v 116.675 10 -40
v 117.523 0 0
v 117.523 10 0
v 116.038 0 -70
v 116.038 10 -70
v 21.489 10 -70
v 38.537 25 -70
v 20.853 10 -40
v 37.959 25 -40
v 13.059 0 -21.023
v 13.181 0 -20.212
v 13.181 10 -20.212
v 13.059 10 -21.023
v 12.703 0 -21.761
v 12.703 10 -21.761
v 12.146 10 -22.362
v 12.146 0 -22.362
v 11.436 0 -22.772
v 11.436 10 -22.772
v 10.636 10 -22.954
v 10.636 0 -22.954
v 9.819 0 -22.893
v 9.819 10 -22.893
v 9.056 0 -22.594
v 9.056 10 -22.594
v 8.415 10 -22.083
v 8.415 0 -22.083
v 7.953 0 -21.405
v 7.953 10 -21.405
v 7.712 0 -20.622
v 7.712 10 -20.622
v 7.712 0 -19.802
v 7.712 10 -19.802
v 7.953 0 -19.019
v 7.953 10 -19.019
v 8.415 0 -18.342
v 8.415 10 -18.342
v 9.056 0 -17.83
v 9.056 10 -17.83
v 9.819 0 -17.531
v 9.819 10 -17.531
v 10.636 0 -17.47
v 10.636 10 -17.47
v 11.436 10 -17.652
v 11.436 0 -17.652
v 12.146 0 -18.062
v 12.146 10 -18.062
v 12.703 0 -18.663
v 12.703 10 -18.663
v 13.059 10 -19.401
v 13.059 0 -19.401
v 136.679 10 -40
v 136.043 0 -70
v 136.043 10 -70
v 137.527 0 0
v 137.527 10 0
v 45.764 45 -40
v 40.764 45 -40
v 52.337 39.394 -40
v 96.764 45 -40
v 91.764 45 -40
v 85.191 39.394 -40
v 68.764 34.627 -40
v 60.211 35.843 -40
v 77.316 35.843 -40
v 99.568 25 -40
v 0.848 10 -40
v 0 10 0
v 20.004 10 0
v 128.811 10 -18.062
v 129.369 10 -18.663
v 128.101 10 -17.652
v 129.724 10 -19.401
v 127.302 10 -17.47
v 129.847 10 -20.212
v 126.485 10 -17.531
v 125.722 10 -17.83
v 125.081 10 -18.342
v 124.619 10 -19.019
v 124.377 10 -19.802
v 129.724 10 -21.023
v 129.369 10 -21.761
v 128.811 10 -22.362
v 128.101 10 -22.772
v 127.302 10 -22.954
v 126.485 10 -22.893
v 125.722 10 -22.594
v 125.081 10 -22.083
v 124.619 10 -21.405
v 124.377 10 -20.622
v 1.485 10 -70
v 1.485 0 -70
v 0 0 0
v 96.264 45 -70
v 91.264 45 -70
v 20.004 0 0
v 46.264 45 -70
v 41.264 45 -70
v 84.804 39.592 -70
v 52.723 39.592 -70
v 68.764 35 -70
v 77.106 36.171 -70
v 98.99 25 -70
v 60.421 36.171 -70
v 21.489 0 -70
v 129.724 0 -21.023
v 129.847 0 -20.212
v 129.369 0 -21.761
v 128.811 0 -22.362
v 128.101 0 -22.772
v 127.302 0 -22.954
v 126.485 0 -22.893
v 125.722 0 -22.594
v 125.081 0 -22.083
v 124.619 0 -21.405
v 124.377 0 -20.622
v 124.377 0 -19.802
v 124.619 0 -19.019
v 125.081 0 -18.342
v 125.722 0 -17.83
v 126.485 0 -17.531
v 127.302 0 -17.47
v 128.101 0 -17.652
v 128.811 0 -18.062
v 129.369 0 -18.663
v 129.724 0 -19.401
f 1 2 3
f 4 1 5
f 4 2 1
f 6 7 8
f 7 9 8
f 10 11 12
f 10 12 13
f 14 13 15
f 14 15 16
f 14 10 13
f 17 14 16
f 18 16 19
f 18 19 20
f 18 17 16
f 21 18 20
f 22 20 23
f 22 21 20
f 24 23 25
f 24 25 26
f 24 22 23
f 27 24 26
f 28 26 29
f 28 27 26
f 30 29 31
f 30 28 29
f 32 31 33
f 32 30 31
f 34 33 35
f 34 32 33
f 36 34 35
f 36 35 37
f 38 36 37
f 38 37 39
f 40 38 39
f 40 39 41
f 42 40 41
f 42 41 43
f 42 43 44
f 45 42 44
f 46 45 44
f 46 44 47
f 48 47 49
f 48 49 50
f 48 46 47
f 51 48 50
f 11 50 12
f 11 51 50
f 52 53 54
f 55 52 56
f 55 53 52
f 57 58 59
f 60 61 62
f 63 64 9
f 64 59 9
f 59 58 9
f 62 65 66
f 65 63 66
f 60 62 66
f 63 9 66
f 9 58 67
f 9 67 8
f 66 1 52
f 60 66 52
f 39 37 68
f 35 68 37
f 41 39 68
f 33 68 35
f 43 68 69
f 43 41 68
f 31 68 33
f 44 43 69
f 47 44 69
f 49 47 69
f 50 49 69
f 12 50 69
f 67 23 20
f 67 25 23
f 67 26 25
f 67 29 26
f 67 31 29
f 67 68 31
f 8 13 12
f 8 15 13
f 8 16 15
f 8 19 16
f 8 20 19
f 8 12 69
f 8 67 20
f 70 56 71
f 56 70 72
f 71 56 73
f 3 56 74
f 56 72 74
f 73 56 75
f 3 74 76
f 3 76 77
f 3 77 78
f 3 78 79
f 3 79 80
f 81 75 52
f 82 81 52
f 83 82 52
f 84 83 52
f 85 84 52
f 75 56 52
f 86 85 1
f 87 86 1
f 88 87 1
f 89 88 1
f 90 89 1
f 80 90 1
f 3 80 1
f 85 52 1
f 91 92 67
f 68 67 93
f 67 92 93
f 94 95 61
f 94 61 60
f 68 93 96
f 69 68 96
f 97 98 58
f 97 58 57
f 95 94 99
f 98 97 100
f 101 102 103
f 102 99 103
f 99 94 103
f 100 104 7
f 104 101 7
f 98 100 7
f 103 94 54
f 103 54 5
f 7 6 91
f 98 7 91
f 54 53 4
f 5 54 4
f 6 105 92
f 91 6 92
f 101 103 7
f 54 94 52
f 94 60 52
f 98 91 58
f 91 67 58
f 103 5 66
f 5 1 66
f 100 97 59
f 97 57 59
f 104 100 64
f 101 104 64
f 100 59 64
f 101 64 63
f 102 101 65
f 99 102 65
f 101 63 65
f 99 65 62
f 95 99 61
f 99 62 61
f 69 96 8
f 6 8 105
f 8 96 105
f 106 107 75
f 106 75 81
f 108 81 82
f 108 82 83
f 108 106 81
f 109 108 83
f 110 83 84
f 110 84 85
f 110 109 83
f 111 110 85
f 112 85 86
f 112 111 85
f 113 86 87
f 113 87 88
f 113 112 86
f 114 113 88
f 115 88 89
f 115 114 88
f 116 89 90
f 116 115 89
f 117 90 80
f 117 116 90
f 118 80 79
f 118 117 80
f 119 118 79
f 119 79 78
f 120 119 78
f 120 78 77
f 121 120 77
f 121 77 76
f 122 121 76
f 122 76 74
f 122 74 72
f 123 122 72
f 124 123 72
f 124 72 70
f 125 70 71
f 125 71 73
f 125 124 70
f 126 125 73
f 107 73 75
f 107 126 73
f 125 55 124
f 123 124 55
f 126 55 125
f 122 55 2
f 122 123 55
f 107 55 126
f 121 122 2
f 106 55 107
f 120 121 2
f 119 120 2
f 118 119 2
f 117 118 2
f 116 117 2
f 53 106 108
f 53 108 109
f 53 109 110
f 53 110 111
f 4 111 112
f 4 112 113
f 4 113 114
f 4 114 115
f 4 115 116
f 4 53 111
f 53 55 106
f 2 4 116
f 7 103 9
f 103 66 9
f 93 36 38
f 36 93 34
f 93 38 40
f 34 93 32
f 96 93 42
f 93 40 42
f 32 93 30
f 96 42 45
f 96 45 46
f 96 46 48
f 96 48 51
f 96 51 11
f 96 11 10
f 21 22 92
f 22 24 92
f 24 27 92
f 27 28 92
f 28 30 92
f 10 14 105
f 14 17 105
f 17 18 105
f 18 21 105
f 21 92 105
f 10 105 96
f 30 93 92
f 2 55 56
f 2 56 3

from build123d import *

# Parameters (mm, degrees)
SKETCH1_R             = 2.75
BOSS_EXTRUDE1_DEPTH   = 10
BOSS_EXTRUDE1_2_DEPTH = 10


with BuildPart() as part:
    # Sketch1 → Boss-Extrude1 (new body)
    with BuildSketch(Plane(origin=(0, 0, 0), x_dir=(1, 0, 0), z_dir=(0, 1, 0))):
        Polygon((0, 0), (20.004497681, 0), (21.489122754, 70), (1.484625073, 70), align=None)
        with Locations((10.430924608, 20.212041611)):
            Circle(SKETCH1_R, mode=Mode.SUBTRACT)
    extrude(amount=BOSS_EXTRUDE1_DEPTH)



with BuildPart() as body_2:
    # Sketch1 → Boss-Extrude1 2 (new body)
    with BuildSketch(Plane(origin=(0, 0, 0), x_dir=(1, 0, 0), z_dir=(0, 1, 0))):
        Polygon((116.0383729, 70), (136.042870581, 70), (137.527495654, 0), (117.522997972, 0), align=None)
        with Locations((127.096571045, 20.212041611)):
            Circle(SKETCH1_R, mode=Mode.SUBTRACT)
    extrude(amount=BOSS_EXTRUDE1_2_DEPTH)


with BuildPart() as part_1:
    add(part.part)

    add(body_2.part)  # Loft1 merges body 2
    # Sketch2 → Loft1 section 0
    with BuildSketch(Plane(origin=(0, 0, -70), x_dir=(-1, 0, 0), z_dir=(0, 0, -1))):
        with BuildLine():
            Line((-91.263747827, 45), (-96.263747827, 45))
            Line((-96.263747827, 45), (-136.042870581, 10))
            Line((-136.042870581, 10), (-116.0383729, 10))
            Line((-116.0383729, 10), (-98.990177434, 25))
            Line((-98.990177434, 25), (-38.53731822, 25))
            Line((-38.53731822, 25), (-21.489122754, 10))
            Line((-21.489122754, 10), (-1.484625073, 10))
            Line((-1.484625073, 10), (-41.263747827, 45))
            Line((-41.263747827, 45), (-46.263747827, 45))
            ThreePointArc((-46.263747827, 45), (-68.763747827, 35), (-91.263747827, 45))
        make_face()
    # Sketch3 → Loft1 section 1
    with BuildSketch(Plane(origin=(0, 0, -40), x_dir=(-1, 0, 0), z_dir=(0, 0, -1))):
        with BuildLine():
            Line((-136.679138469, 10), (-96.763747827, 45))
            Line((-96.763747827, 45), (-91.763747827, 45))
            ThreePointArc((-91.763747827, 45), (-68.763747827, 34.627036727), (-45.763747827, 45))
            Line((-45.763747827, 45), (-40.763747827, 45))
            Line((-40.763747827, 45), (-0.848357184, 10))
            Line((-0.848357184, 10), (-20.852854866, 10))
            Line((-20.852854866, 10), (-37.959450855, 25))
            Line((-37.959450855, 25), (-99.568044798, 25))
            Line((-99.568044798, 25), (-116.674640788, 10))
            Line((-116.674640788, 10), (-136.679138469, 10))
        make_face()
    loft()


solid = part_1.part
